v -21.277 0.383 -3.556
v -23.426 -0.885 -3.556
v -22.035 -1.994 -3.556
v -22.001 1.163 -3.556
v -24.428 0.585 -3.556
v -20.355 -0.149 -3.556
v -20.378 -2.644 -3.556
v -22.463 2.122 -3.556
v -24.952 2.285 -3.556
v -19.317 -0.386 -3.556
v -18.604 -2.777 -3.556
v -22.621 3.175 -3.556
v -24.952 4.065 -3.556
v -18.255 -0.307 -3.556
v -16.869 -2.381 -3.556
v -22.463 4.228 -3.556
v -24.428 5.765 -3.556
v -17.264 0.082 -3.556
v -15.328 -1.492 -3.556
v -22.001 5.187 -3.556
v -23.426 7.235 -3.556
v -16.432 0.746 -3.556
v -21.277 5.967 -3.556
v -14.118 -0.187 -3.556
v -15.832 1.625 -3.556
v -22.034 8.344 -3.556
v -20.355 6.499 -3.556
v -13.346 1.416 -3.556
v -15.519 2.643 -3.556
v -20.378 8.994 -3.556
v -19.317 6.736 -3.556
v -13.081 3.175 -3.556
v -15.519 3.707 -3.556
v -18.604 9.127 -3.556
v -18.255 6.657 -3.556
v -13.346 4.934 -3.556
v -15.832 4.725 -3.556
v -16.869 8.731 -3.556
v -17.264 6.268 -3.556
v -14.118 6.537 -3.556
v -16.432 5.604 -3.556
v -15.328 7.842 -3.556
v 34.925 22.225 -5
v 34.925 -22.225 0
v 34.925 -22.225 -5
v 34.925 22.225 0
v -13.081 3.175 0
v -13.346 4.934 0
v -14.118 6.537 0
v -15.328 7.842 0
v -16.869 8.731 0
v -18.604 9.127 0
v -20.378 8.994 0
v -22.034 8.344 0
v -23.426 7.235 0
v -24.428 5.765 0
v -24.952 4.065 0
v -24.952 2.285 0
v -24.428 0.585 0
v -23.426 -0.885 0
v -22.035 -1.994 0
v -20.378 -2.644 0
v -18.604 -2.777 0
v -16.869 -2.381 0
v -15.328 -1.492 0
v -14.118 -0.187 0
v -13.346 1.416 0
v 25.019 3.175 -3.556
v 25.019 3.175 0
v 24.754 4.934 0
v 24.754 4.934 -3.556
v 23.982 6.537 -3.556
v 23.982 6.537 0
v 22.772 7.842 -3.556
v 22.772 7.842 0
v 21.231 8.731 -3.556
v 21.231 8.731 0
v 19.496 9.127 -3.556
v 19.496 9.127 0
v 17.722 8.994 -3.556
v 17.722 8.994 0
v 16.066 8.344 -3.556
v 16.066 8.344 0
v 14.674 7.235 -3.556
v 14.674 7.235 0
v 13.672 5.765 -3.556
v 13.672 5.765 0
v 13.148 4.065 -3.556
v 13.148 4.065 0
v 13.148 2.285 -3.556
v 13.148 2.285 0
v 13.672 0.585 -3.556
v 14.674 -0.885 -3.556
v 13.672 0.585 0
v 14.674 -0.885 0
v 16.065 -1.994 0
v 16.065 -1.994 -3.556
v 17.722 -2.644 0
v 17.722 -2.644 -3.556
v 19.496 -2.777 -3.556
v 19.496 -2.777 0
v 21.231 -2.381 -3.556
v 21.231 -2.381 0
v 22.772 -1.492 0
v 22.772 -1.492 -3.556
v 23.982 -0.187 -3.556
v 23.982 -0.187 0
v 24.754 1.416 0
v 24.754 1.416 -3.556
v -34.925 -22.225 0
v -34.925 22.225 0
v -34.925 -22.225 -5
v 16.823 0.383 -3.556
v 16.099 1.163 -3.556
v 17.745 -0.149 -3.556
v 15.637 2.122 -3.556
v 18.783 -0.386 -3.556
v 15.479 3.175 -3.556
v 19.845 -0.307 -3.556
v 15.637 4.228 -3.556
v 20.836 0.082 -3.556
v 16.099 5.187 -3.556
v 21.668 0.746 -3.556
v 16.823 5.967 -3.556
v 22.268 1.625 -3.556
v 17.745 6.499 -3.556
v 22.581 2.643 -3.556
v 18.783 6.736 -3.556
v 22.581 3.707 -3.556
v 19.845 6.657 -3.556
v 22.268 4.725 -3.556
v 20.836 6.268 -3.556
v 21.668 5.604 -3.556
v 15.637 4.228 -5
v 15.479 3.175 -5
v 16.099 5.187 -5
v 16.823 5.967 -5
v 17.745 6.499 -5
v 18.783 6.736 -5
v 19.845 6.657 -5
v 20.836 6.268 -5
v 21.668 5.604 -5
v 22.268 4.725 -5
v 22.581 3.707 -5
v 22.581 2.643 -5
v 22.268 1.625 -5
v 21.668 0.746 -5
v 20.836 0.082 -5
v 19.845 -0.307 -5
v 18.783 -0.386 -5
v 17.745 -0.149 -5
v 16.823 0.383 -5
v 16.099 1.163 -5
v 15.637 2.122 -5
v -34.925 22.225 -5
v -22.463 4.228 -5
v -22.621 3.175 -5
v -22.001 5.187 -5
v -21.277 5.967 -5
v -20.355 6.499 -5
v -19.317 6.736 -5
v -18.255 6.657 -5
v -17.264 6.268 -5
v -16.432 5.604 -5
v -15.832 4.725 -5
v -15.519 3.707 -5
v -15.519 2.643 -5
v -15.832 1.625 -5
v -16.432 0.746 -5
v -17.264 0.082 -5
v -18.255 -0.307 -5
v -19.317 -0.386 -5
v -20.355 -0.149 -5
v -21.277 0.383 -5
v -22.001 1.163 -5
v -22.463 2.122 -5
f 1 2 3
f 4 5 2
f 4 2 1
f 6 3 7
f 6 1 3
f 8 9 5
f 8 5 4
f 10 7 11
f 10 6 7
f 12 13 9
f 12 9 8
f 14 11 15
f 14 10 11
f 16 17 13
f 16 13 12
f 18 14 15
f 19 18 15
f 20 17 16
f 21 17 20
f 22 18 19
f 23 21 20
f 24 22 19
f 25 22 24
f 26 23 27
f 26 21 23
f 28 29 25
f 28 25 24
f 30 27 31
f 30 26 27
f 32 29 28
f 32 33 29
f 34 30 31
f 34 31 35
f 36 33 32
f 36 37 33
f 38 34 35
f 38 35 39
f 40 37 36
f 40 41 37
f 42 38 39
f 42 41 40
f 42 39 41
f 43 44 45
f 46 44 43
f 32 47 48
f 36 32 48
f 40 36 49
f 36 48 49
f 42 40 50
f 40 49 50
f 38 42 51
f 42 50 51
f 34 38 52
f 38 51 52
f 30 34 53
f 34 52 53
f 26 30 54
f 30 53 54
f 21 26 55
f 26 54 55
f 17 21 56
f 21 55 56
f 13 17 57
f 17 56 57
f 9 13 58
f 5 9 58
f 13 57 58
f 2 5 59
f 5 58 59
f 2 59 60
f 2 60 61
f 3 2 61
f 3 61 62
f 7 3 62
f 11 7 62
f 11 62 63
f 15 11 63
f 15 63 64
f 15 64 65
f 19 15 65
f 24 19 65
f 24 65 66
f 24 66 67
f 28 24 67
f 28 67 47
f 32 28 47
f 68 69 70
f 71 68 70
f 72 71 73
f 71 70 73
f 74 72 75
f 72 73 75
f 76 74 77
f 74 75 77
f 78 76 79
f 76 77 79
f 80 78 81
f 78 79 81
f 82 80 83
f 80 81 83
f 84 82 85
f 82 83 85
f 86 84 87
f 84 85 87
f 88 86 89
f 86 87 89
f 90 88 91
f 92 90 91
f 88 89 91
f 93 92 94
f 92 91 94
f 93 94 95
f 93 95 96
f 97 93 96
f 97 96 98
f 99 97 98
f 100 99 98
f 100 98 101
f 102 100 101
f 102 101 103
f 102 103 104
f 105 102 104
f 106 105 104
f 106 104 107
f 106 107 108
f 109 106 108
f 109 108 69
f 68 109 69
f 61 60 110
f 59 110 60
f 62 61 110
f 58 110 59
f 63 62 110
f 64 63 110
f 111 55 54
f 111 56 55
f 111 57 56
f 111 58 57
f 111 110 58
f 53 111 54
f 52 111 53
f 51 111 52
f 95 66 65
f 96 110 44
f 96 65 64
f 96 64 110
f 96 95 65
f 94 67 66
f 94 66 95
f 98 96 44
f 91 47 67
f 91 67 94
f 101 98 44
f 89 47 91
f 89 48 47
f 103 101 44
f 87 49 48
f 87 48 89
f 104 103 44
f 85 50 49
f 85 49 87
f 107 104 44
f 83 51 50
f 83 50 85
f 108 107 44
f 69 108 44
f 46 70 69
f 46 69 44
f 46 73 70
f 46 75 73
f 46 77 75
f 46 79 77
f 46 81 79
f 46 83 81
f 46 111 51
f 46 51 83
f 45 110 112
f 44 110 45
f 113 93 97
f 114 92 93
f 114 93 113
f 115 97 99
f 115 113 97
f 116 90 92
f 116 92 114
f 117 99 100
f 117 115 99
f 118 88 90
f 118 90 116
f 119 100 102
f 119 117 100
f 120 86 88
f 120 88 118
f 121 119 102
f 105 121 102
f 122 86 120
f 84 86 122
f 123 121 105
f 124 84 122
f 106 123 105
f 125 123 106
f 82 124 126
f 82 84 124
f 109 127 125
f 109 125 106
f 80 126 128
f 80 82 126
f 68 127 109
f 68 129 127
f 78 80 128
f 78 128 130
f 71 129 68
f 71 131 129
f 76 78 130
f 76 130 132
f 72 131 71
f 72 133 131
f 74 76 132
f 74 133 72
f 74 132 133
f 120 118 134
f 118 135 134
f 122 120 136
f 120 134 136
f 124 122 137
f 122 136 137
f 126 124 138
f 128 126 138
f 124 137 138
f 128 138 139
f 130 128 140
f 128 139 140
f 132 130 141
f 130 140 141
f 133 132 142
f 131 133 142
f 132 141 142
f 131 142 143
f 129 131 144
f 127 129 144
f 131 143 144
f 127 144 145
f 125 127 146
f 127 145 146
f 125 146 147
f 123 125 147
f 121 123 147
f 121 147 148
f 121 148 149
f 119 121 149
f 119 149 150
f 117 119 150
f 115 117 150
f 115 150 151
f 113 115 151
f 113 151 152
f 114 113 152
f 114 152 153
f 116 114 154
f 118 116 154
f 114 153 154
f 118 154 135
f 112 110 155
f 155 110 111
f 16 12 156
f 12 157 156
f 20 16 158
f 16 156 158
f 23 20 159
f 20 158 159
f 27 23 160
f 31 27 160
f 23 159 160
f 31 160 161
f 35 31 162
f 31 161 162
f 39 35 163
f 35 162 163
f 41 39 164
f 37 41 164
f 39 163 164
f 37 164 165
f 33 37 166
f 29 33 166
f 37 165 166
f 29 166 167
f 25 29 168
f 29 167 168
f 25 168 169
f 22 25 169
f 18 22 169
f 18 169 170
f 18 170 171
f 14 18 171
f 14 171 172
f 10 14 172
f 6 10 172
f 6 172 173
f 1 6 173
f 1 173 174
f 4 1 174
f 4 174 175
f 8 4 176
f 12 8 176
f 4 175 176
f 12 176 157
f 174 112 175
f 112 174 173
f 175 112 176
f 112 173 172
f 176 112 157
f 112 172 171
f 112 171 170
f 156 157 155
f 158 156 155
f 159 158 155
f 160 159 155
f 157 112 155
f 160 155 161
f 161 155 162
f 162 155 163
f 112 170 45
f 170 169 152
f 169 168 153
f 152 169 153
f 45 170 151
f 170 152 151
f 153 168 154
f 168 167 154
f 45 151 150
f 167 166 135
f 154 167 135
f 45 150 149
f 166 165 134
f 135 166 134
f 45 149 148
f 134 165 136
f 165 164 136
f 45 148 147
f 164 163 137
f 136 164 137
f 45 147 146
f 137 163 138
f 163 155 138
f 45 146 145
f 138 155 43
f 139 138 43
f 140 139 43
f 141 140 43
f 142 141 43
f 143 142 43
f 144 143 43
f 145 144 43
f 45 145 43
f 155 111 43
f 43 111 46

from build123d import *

# Parameters (mm, degrees)
CROQUIS1_W                                           = 69.85
CROQUIS1_H                                           = 44.45
SALIENTE_EXTRUIR1_DEPTH                              = 5
REFRENTADO_PARA_TORNILLO_CON_CABEZA_HUEC_D           = 7.14248
REFRENTADO_PARA_TORNILLO_CON_CABEZA_HUEC_DEPTH       = 24
REFRENTADO_PARA_TORNILLO_CON_CABEZA_HUEC_CBORE_D     = 11.938
REFRENTADO_PARA_TORNILLO_CON_CABEZA_HUEC_CBORE_DEPTH = 3.556
REFRENTADO_PARA_TORNILLO_CON_CABEZA_HUEC_TIP         = 2.145817477


with BuildPart() as part:
    # Croquis1 → Saliente-Extruir1 (new body)
    with BuildSketch(Plane.XY):
        Rectangle(CROQUIS1_W, CROQUIS1_H)
    extrude(amount=-SALIENTE_EXTRUIR1_DEPTH)

    # Refrentado para tornillo con cabeza hueca de 1/42
    with Locations(Plane.XY):
        with Locations((-19.05, 3.175), (19.05, 3.175)):
            CounterBoreHole(REFRENTADO_PARA_TORNILLO_CON_CABEZA_HUEC_D / 2, REFRENTADO_PARA_TORNILLO_CON_CABEZA_HUEC_CBORE_D / 2, REFRENTADO_PARA_TORNILLO_CON_CABEZA_HUEC_CBORE_DEPTH, depth=REFRENTADO_PARA_TORNILLO_CON_CABEZA_HUEC_DEPTH)
            with Locations((0, 0, -(REFRENTADO_PARA_TORNILLO_CON_CABEZA_HUEC_DEPTH + REFRENTADO_PARA_TORNILLO_CON_CABEZA_HUEC_TIP / 2))):  # 118° drill point
                Cone(0, REFRENTADO_PARA_TORNILLO_CON_CABEZA_HUEC_D / 2, REFRENTADO_PARA_TORNILLO_CON_CABEZA_HUEC_TIP, mode=Mode.SUBTRACT)


solid = part.part
